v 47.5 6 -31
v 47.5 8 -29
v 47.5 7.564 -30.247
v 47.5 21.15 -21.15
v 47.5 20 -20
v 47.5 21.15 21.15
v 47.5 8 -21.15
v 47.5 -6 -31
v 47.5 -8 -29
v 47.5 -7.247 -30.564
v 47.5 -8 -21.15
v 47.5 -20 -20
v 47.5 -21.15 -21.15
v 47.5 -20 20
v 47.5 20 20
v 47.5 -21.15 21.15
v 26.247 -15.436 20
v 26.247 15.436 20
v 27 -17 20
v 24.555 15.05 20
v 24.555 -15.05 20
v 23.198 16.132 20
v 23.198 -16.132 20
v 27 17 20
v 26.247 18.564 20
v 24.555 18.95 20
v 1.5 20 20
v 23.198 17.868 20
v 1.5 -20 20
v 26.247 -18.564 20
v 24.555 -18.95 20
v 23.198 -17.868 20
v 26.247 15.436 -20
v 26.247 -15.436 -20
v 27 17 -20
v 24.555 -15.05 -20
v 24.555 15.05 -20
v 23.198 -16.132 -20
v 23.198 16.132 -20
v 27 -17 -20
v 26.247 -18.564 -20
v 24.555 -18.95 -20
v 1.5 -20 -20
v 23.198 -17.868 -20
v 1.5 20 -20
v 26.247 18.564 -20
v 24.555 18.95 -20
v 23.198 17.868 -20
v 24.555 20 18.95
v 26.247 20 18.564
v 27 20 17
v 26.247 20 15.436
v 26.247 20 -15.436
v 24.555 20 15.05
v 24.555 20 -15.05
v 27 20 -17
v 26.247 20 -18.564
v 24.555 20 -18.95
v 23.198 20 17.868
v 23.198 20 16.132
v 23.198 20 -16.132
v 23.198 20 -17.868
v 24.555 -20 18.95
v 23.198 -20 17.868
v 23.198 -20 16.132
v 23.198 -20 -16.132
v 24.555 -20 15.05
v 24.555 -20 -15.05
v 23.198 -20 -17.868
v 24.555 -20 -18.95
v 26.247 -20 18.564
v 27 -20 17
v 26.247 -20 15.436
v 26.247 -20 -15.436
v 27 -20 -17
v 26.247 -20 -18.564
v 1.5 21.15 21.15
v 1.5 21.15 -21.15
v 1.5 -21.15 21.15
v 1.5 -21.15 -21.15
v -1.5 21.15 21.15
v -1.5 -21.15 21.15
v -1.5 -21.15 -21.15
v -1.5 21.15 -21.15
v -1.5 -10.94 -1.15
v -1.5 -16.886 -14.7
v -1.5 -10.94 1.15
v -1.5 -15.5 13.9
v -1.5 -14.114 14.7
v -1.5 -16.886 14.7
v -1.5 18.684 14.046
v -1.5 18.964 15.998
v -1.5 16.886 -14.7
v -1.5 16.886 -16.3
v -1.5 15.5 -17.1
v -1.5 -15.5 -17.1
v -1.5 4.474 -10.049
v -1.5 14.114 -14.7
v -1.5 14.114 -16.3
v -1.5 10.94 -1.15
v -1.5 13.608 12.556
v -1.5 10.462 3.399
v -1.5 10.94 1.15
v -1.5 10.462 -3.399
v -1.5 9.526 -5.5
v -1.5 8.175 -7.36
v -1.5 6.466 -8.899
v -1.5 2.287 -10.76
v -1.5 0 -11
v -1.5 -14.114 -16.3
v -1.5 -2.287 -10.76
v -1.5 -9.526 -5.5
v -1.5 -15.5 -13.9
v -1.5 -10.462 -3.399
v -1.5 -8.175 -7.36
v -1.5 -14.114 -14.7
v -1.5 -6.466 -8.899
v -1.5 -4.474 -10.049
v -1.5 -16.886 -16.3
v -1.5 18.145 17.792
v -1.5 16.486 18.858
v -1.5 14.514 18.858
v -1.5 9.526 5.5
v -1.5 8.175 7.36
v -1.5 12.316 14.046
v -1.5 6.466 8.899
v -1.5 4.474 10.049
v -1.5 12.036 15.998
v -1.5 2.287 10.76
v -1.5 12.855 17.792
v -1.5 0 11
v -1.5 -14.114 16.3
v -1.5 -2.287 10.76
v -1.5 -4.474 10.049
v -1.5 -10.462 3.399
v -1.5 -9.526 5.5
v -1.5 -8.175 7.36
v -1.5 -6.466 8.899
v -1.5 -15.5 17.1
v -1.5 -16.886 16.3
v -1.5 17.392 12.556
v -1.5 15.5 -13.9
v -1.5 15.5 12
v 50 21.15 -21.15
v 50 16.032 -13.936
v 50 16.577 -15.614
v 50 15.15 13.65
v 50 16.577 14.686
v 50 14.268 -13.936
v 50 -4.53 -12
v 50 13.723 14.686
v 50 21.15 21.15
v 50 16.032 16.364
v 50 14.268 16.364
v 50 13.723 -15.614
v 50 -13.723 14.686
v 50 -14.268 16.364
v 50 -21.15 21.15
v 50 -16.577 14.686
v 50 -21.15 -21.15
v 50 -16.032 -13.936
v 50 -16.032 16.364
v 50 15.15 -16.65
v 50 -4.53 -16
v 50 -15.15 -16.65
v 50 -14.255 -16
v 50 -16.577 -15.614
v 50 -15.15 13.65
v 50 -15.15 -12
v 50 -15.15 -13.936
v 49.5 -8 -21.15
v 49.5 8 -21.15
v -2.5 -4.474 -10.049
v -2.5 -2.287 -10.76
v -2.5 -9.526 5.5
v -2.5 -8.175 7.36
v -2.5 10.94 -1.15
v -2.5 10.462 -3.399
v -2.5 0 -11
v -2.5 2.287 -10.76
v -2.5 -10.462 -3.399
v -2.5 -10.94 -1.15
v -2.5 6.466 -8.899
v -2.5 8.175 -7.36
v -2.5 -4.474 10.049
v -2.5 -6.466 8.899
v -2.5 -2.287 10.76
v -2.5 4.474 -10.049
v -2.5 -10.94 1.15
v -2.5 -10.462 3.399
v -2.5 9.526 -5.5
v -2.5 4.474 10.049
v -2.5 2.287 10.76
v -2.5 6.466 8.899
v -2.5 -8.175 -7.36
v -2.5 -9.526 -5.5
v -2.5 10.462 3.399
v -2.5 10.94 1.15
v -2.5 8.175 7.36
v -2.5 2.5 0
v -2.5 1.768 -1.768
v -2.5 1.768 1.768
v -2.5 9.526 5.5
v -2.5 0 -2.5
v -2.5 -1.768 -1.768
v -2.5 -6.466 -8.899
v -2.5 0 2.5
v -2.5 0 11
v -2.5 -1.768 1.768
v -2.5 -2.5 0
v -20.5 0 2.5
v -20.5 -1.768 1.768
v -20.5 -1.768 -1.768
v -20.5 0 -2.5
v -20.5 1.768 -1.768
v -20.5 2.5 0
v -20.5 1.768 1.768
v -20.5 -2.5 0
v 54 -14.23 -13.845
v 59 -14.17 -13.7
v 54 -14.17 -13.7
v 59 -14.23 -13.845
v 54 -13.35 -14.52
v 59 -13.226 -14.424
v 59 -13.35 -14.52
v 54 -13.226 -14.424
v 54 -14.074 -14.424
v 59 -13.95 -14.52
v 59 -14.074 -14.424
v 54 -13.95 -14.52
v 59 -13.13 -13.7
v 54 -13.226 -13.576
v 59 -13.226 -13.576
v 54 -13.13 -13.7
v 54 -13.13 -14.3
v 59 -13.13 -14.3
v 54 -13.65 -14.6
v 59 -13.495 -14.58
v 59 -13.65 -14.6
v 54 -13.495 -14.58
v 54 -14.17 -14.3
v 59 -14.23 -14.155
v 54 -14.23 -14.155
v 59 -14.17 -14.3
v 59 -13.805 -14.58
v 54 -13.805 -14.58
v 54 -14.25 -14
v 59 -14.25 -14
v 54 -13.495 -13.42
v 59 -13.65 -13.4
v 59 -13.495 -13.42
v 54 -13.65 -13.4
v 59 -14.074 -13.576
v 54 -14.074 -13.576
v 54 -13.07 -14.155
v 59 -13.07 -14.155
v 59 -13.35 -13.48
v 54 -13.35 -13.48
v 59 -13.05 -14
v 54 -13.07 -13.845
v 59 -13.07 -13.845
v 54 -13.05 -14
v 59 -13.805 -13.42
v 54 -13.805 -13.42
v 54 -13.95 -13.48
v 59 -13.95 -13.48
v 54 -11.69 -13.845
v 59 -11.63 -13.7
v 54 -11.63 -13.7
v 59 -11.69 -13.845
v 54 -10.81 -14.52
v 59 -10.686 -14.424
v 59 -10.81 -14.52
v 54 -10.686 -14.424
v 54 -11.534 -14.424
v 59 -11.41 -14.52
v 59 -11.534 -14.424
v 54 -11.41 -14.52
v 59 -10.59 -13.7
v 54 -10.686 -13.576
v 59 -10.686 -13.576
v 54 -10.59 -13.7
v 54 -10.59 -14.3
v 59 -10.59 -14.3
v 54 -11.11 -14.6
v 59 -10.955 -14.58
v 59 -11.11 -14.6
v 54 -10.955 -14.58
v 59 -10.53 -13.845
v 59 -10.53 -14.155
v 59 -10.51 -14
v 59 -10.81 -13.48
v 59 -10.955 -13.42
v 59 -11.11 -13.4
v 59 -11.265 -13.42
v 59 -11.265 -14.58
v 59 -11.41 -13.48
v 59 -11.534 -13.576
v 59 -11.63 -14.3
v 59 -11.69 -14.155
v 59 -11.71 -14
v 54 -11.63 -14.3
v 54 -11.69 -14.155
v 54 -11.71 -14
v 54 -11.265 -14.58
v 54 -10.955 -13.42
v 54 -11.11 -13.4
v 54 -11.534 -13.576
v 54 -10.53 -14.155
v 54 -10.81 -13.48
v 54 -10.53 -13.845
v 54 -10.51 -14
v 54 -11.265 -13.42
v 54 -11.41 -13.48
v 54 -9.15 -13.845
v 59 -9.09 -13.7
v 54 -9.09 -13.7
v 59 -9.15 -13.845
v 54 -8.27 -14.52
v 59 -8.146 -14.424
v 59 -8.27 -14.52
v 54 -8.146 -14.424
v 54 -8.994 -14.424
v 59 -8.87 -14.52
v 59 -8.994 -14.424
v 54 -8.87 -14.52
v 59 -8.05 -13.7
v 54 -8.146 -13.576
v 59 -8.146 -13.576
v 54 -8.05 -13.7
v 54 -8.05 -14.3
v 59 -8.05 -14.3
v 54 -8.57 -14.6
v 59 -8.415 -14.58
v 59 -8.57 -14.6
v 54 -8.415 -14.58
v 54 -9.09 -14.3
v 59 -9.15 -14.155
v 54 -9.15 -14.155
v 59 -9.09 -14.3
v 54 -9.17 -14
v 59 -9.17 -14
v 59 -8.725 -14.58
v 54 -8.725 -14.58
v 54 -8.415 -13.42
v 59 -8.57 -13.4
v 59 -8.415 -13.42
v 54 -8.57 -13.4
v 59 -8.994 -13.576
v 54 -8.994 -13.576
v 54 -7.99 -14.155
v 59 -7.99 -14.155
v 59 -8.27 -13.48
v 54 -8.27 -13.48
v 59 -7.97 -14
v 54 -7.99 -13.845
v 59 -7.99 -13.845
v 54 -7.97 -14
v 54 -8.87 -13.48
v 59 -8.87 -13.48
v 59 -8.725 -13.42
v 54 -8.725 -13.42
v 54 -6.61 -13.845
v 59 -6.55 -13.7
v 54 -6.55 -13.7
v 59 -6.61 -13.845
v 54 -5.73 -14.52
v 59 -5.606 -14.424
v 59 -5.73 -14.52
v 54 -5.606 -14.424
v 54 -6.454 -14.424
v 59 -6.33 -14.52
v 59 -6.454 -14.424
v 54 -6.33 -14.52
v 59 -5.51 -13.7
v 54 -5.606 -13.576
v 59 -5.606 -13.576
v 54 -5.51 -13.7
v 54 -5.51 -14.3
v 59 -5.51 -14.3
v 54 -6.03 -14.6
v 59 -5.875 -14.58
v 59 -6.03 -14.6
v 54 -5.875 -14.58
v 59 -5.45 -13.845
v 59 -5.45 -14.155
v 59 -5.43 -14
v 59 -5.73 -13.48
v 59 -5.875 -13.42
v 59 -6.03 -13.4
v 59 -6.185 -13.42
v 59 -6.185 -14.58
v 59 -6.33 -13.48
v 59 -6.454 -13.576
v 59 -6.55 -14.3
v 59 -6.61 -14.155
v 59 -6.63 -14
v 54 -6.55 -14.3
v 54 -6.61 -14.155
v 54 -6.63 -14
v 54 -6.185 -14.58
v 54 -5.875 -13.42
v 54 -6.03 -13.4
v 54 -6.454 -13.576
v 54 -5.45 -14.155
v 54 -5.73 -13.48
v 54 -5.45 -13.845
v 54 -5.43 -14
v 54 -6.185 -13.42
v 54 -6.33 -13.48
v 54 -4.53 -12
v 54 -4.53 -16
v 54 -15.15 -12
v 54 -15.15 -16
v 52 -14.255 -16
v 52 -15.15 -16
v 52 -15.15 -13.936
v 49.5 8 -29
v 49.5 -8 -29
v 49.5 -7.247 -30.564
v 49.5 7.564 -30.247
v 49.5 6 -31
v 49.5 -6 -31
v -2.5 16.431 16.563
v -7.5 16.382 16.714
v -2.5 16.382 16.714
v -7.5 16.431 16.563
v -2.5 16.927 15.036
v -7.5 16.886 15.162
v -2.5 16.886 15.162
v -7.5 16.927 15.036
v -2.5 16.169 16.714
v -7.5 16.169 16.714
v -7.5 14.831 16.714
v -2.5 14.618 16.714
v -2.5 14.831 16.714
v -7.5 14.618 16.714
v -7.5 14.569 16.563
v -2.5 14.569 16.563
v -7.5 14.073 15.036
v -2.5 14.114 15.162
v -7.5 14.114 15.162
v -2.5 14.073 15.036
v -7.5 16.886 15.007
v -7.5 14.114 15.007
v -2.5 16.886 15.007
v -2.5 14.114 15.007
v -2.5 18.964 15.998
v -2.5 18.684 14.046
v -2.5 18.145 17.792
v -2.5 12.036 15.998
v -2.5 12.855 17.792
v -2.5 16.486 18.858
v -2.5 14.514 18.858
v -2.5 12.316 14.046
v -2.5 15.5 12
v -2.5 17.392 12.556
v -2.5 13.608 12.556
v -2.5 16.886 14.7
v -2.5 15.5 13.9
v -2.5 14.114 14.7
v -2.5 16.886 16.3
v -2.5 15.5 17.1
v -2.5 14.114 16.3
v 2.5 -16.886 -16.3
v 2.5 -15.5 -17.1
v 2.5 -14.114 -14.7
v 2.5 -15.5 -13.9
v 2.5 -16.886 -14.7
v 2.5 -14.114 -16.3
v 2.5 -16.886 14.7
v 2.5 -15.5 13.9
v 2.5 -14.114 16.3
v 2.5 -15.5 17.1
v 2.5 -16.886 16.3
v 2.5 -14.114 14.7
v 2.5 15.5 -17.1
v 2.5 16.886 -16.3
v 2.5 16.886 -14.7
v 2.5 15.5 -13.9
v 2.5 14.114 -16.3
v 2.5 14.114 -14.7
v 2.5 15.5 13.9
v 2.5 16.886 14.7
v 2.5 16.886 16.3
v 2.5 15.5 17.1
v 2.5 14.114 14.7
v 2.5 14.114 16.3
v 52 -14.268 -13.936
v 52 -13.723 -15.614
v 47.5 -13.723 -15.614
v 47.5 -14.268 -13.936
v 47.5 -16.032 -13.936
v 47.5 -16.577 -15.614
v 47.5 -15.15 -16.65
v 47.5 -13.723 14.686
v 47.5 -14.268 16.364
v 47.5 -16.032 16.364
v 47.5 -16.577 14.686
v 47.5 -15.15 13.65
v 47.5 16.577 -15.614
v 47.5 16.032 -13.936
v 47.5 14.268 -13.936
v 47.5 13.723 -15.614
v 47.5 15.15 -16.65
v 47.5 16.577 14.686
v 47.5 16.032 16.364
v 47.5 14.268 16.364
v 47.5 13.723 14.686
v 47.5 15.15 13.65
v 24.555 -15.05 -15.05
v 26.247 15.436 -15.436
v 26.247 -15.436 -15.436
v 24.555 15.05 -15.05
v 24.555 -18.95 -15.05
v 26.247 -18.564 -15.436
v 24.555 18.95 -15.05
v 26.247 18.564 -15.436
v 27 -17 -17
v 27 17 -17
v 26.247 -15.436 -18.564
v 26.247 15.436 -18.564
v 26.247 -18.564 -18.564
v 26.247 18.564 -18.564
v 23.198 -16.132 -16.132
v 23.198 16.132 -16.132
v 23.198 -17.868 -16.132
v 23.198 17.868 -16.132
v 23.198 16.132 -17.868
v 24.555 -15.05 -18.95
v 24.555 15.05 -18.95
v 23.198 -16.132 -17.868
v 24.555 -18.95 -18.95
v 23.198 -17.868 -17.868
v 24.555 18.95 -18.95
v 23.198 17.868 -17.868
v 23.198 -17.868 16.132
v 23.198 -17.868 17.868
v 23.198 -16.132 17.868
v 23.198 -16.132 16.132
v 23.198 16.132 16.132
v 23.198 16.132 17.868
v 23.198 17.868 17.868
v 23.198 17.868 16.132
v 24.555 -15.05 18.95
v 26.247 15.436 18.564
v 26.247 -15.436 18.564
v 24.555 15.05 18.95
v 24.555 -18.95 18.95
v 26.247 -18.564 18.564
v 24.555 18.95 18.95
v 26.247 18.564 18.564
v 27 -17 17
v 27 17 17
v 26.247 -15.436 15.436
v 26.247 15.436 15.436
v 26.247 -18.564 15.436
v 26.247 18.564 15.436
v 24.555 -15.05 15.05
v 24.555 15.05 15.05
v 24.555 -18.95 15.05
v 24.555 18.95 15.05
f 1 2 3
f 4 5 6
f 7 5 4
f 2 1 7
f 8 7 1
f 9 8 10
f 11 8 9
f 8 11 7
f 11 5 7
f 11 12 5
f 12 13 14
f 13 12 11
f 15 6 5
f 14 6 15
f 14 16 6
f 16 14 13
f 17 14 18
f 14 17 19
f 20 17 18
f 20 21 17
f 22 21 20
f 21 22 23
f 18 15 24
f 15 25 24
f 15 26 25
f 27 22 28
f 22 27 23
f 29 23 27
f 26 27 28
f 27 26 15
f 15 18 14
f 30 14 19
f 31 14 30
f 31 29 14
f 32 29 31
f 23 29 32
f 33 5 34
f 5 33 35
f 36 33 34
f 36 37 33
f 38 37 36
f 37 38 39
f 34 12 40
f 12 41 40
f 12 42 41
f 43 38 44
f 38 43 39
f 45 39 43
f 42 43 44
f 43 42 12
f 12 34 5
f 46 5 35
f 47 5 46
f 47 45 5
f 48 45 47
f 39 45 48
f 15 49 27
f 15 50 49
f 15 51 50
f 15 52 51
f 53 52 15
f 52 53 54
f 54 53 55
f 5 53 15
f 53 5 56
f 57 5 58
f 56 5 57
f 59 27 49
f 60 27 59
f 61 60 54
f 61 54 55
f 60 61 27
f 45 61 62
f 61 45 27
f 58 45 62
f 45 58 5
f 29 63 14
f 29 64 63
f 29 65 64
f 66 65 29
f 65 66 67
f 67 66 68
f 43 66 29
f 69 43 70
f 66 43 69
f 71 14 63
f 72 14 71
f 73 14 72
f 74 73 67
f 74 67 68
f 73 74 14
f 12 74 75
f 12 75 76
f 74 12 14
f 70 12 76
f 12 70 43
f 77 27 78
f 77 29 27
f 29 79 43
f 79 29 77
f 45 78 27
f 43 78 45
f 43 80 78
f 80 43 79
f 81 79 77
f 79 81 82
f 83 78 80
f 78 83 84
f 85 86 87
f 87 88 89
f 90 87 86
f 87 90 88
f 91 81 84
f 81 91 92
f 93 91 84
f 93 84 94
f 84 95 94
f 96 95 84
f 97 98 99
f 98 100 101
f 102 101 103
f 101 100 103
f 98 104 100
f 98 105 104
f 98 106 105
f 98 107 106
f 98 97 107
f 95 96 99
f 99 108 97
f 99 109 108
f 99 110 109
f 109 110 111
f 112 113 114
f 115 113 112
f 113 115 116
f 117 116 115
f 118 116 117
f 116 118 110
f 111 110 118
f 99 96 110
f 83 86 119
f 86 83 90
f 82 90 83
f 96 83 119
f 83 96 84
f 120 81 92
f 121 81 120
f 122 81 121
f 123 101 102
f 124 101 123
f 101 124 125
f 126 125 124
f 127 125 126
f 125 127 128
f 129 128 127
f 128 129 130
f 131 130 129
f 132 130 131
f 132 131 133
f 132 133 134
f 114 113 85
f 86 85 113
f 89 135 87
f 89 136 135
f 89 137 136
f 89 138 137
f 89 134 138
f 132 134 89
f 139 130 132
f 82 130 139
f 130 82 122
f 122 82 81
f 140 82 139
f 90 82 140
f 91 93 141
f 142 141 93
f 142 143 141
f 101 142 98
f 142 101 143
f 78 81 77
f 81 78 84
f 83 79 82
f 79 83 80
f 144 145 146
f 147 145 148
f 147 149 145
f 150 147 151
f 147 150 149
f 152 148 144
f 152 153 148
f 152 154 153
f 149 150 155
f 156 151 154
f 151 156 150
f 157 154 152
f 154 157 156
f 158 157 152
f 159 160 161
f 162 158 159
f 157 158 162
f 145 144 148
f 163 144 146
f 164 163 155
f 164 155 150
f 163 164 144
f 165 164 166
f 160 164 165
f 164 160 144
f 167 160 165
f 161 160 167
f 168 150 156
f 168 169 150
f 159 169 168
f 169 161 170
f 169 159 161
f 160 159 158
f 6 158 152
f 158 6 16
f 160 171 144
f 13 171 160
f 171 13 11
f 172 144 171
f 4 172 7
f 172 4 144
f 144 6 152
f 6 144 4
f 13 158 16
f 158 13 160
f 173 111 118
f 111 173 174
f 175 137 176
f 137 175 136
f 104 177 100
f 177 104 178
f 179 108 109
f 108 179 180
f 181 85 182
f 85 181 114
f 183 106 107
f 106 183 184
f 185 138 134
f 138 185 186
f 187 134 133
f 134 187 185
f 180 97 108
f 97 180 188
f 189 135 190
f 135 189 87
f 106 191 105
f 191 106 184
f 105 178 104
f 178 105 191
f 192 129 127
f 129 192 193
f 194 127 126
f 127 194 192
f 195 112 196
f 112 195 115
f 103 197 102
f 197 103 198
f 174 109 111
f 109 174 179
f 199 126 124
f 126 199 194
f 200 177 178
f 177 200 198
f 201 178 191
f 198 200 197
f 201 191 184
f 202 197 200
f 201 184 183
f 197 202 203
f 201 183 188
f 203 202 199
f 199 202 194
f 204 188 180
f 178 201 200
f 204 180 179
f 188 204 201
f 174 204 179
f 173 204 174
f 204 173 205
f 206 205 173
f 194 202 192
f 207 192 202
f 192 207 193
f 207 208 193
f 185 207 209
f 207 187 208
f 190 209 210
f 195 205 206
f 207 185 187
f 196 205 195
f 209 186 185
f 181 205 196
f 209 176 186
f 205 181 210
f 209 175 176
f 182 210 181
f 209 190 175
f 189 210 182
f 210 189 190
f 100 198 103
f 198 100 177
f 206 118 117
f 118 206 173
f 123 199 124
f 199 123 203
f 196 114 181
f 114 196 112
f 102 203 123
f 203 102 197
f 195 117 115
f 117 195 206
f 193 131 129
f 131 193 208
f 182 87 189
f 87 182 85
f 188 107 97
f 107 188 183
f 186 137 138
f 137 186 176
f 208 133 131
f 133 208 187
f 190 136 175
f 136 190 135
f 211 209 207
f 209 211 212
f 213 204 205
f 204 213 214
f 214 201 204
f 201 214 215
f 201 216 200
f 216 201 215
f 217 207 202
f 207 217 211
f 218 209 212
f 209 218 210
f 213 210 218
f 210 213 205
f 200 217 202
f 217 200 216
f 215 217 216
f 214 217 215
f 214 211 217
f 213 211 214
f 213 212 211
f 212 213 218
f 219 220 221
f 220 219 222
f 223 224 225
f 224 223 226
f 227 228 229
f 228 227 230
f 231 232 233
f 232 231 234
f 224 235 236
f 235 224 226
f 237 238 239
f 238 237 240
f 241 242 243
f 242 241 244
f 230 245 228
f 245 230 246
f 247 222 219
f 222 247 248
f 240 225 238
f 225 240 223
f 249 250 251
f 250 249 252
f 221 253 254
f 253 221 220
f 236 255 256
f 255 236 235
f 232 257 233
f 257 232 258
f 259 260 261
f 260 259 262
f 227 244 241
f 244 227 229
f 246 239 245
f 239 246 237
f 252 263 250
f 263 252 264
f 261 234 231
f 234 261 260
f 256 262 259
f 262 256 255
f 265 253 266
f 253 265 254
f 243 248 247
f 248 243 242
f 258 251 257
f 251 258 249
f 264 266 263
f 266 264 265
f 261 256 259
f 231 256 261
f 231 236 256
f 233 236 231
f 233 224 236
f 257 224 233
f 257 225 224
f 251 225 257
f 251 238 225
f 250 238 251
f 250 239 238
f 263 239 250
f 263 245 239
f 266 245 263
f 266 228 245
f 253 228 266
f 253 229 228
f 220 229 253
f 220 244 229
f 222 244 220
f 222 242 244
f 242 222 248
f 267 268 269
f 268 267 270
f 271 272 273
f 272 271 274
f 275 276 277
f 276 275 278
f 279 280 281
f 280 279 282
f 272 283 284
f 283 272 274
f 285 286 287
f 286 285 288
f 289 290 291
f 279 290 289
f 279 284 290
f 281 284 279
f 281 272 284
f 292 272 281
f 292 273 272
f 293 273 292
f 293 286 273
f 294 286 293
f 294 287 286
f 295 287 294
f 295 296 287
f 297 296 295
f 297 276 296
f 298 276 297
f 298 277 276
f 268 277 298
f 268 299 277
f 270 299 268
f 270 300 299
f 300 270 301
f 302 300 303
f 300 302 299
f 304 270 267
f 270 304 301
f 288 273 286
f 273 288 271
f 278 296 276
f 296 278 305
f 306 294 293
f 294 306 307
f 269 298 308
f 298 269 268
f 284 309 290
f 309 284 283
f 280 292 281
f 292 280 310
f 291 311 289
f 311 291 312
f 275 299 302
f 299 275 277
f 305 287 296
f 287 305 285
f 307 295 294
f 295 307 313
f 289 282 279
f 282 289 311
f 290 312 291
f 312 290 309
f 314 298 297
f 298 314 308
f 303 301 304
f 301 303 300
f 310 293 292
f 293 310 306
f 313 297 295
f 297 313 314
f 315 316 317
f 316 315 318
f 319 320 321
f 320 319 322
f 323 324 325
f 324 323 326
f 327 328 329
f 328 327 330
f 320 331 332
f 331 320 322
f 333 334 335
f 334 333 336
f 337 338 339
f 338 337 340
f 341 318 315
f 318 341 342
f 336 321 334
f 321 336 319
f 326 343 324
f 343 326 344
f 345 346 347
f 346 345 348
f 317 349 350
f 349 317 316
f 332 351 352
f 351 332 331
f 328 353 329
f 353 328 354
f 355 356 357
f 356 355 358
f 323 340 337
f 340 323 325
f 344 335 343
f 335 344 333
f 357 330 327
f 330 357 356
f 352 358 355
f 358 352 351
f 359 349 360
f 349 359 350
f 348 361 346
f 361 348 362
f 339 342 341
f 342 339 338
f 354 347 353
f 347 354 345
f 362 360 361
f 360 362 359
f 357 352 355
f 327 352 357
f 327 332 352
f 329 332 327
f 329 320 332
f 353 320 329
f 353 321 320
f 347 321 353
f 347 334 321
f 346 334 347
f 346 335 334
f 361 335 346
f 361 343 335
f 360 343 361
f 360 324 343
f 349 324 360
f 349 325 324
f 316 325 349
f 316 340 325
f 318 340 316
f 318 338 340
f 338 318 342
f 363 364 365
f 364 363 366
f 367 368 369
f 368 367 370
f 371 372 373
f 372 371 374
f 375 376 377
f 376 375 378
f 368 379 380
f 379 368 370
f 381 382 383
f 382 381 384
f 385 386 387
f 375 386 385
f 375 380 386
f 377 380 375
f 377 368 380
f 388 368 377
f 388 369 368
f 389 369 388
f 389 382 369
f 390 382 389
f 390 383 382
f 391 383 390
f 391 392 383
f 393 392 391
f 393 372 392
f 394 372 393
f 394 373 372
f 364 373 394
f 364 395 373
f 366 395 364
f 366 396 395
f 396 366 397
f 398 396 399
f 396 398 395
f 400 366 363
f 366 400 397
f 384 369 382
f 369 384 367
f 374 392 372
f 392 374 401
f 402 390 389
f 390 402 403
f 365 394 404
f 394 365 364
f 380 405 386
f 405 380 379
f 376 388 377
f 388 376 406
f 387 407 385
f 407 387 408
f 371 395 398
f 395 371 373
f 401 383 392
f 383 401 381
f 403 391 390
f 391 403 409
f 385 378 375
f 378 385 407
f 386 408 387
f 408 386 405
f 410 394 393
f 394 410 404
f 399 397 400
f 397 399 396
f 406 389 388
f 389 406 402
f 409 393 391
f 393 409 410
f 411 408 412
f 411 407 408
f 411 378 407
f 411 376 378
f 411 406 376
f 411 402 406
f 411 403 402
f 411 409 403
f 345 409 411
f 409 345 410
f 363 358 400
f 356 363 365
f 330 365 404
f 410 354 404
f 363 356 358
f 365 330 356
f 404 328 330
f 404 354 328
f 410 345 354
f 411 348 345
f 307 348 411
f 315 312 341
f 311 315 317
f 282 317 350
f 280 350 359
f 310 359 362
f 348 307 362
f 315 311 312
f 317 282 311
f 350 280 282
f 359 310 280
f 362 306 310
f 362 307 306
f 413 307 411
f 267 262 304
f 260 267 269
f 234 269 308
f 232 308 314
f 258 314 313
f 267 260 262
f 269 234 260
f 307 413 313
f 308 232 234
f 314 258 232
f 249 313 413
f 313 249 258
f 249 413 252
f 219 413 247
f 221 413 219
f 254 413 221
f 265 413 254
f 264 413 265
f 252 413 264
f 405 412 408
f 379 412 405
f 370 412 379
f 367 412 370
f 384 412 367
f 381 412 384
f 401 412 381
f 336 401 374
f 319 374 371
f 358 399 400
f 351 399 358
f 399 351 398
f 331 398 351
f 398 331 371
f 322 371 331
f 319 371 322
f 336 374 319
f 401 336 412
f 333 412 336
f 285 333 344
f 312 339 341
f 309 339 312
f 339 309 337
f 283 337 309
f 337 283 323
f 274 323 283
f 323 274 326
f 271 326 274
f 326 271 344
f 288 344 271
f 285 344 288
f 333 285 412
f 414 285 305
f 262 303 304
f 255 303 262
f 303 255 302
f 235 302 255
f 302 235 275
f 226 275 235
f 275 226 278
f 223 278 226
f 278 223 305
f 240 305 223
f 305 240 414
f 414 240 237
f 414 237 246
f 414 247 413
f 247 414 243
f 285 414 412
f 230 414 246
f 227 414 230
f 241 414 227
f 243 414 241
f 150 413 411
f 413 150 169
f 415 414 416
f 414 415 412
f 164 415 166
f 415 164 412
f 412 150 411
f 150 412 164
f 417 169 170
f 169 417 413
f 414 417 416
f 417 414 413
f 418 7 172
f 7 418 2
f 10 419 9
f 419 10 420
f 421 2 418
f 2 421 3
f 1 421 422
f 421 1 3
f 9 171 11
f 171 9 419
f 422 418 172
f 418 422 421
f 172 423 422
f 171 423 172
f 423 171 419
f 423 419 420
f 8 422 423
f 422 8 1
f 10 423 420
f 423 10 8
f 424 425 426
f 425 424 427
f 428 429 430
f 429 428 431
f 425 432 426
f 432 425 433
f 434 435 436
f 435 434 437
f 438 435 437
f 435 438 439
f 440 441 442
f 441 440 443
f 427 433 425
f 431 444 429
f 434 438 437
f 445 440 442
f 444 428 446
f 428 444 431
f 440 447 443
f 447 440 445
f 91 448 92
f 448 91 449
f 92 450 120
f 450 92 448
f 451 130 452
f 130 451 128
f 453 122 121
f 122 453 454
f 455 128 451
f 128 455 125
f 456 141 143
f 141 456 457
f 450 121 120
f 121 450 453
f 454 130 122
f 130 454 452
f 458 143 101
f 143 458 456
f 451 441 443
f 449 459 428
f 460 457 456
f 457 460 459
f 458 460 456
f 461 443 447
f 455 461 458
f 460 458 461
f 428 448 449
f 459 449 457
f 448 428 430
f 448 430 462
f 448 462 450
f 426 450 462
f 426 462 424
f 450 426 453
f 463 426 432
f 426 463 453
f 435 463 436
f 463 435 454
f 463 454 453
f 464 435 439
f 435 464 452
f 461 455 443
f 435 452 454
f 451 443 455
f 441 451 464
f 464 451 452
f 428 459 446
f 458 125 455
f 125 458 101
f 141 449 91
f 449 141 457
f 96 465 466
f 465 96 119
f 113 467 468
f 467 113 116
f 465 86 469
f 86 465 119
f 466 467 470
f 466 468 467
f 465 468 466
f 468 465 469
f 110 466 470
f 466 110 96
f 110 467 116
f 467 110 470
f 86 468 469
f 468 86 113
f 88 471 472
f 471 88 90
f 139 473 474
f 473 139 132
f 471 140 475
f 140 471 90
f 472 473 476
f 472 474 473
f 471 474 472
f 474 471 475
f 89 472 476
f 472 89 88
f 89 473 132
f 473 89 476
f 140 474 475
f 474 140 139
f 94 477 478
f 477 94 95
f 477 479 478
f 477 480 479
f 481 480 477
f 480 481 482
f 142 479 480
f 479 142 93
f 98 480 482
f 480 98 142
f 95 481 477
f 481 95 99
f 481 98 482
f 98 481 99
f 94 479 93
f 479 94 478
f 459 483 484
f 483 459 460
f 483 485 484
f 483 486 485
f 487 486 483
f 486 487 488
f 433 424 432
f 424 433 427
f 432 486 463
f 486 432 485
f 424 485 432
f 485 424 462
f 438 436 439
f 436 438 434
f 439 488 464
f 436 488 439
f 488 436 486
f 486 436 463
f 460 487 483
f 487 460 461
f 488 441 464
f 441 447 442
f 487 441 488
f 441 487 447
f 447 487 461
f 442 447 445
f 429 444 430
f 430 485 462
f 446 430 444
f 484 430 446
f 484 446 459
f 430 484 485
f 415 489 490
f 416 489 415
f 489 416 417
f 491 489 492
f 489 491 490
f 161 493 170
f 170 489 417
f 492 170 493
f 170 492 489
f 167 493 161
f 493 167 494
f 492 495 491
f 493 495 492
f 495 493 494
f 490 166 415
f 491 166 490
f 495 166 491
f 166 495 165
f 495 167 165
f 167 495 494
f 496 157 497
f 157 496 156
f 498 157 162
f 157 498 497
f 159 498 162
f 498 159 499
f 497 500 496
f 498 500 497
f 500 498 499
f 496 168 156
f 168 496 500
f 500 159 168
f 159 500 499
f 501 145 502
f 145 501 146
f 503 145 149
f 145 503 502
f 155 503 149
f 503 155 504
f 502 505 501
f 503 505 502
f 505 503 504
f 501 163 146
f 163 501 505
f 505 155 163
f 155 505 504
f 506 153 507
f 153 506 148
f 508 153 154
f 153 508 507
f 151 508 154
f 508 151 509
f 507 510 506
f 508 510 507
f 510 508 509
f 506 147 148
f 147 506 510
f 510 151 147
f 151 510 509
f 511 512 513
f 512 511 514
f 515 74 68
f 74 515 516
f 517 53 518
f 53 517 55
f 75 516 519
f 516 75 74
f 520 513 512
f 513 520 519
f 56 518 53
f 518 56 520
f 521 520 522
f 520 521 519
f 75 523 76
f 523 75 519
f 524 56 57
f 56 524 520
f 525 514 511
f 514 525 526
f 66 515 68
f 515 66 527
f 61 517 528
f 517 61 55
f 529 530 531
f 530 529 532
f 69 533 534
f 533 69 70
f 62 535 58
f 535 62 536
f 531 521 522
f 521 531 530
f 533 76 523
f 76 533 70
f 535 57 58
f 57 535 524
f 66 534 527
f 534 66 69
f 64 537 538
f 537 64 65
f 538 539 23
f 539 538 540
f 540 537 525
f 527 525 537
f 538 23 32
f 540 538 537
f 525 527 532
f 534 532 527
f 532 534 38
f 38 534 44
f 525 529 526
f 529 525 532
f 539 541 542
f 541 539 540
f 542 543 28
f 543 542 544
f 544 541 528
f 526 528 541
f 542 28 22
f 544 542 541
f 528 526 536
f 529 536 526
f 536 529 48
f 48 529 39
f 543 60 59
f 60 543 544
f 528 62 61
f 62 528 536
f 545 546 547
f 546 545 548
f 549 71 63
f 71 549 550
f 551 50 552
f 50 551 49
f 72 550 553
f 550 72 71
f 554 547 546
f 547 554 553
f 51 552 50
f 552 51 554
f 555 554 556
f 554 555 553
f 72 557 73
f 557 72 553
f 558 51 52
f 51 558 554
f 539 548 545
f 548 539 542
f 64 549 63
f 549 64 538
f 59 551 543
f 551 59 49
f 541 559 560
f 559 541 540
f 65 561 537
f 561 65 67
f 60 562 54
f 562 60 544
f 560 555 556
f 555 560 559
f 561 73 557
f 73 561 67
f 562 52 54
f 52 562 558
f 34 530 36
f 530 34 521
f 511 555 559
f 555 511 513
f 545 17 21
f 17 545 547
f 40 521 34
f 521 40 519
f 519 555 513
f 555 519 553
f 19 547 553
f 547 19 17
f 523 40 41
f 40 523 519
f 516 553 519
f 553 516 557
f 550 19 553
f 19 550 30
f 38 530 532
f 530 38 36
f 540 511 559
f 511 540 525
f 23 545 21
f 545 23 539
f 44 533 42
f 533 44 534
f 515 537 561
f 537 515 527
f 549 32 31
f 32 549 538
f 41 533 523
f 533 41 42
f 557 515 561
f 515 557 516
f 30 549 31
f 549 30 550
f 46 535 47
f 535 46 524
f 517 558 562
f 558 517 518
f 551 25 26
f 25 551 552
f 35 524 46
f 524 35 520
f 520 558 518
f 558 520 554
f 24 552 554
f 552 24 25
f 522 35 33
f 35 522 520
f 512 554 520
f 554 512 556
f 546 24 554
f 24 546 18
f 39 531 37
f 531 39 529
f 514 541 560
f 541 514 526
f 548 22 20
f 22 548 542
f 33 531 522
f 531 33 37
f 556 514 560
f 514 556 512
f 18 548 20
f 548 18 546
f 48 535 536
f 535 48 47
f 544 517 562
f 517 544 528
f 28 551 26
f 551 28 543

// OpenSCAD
// Parameters
face_width = 42.3; //[21.15:84.6:0.1]
body_length = 47; //[23.5:94:0.1]
body_depth = 40; //[20:80:0.1]
body_height = 40; //[20:80:0.1]
front_face_thickness = 3; //[1.5:6:0.1]
rear_cap_thickness = 2.5; //[1.25:5:0.1]
corner_radius = 2; //[1:4:0.1]
boss_diameter = 22; //[11:44:0.1]
boss_height = 2; //[1:4:0.1]
shaft_diameter = 5; //[2.5:10:0.1]
shaft_length = 20; //[10:40:0.1]
mount_hole_spacing = 31; //[15.5:62:0.1]
mount_hole_diameter = 3.2; //[1.6:6.4:0.1]
mount_hole_depth = 6; //[3:12:0.1]
eps_overlap = 1; //[0.5:2:0.1]
dplug_length = 18; //[9:36:0.1]
dplug_width = 12; //[6:24:0.1]
dplug_rad = 2; //[1:4:0.1]
dplug_thickness = 2; //[1:4:0.1]
grill_hole_diameter = 3; //[1.5:6:0.1]
grill_margin = 6; //[3:12:0.1]
ttrack_hole_diameter = 4; //[2:8:0.1]
rail_hole_diameter = 4; //[2:8:0.1]
screw_shank_diameter = 3; //[1.5:6:0.1]
screw_length = 10; //[5:20:0.1]
washer_diameter = 7; //[3.5:14:0.1]
washer_thickness = 1; //[0.5:2:0.1]

// Added: rear electrical connector/pins (and ensured attachment)
pin_diameter = 1.2;
pin_length = 6;
pin_spacing = 2.54;
pin_count = 4;
pin_block_w = (pin_count-1)*pin_spacing + 3.0;  // small housing width
pin_block_h = 4.0;
pin_block_t = 4.0; // thickness along X (sticks out of rear)
pin_z_offset = -body_height/2 + 6; // near bottom like typical motors

// Convenience: rear face X position of the rear cap (outermost)
rear_face_x = front_face_thickness/2 + body_length + rear_cap_thickness/2;

// NEMA-style stepper motor
module NEMA_motor() {
  // Motor body
  color("Black")
  union() {
    translate([front_face_thickness/2 + body_length/2 - eps_overlap, 0, 0])
      cube([body_length, body_depth, body_height], center=true);

    // Front face
    translate([0, 0, 0])
      cube([front_face_thickness, face_width, face_width], center=true);

    // Rear cap
    translate([rear_face_x - eps_overlap, 0, 0])
      cube([rear_cap_thickness, face_width, face_width], center=true);

    // Shaft center boss
    translate([-front_face_thickness/2 - boss_height/2 + eps_overlap, 0, 0])
      rotate([0, 90, 0])
      cylinder(r=boss_diameter/2, h=boss_height, center=true);

    // Output shaft
    color("Silver")
    translate([-front_face_thickness/2 - shaft_length/2 + eps_overlap, 0, 0])
      rotate([0, 90, 0])
      cylinder(r=shaft_diameter/2, h=shaft_length, center=true);
  }
}

// Rear electrical connector/pins (physically attached with overlap into rear cap)
module rear_connector_and_pins() {
  // Place connector so it intersects the rear cap by eps_overlap (1-2mm)
  // Rear cap outer face is at: rear_face_x + rear_cap_thickness/2
  // We want the connector block to start inside the cap by eps_overlap.
  conn_center_x =
    (rear_face_x + rear_cap_thickness/2) + (pin_block_t/2) - eps_overlap;

  // Put it near one side/bottom like typical NEMA motors
  conn_center_y = -face_width/2 + pin_block_w/2 + 6;

  union() {
    // Small housing block (grey)
    color("DimGray")
      translate([conn_center_x, conn_center_y, pin_z_offset])
        cube([pin_block_t, pin_block_w, pin_block_h], center=true);

    // Pins (orange) protruding further out, but rooted inside the housing
    // Ensure each pin overlaps into the housing by eps_overlap.
    color("Orange")
      for (i = [0:pin_count-1]) {
        y_i = conn_center_y + (i - (pin_count-1)/2) * pin_spacing;
        translate([
          conn_center_x + pin_block_t/2 + pin_length/2 - eps_overlap,
          y_i,
          pin_z_offset
        ])
          rotate([0, 90, 0])
          cylinder(r=pin_diameter/2, h=pin_length, center=true, $fn=24);
      }
  }
}

// D Plug D (kept, but ensured it intersects the body slightly)
module d_plug_D() {
  // Attach to rear area and overlap into the rear cap/body by eps_overlap
  plug_center_x =
    (rear_face_x - rear_cap_thickness/2) + (dplug_thickness/2) - eps_overlap;

  color("DimGray")
    translate([plug_center_x, 0, -body_height/2 + dplug_thickness/2 - eps_overlap])
      rotate([0, 90, 0])
      linear_extrude(height=dplug_thickness, center=true)
      offset(r=dplug_rad)
      square([dplug_length, dplug_width], center=true);
}

// Grill Hole Positions (cutters)
module grill_hole_positions() {
  for (x = [-1, 1])
    for (y = [-1, 1])
      translate([rear_face_x, x * (face_width/2 - grill_margin), y * (face_width/2 - grill_margin)])
        rotate([0, 90, 0])
        cylinder(r=grill_hole_diameter/2, h=rear_cap_thickness + 2*eps_overlap, center=true);
}

// Screw and Washer (kept as-is; these are external hardware, but unioned)
module screw_and_washer() {
  color("Silver") {
    // Screw shank
    translate([front_face_thickness/2 - screw_length/2 + eps_overlap, mount_hole_spacing/2, mount_hole_spacing/2])
      rotate([0, 90, 0])
      cylinder(r=screw_shank_diameter/2, h=screw_length, center=true);
    // Washer
    translate([-front_face_thickness/2 + washer_thickness/2 - eps_overlap, mount_hole_spacing/2, mount_hole_spacing/2])
      rotate([0, 90, 0])
      cylinder(r=washer_diameter/2, h=washer_thickness, center=true);
  }
}

// Ttrack Hole Positions (cutters)
module ttrack_hole_positions() {
  for (z = [-1, 1])
    translate([front_face_thickness/2 + body_length/2, 0, z * (body_height/2 - ttrack_hole_diameter/2 - eps_overlap)])
      rotate([90, 0, 0])
      cylinder(r=ttrack_hole_diameter/2, h=body_depth + 2*eps_overlap, center=true);
}

// Rail Hole Positions (cutters)
module rail_hole_positions() {
  for (y = [-1, 1])
    translate([front_face_thickness/2 + body_length/2, y * (body_depth/2 - rail_hole_diameter/2 - eps_overlap), 0])
      cylinder(r=rail_hole_diameter/2, h=body_height + 2*eps_overlap, center=true);
}

// Assembly
module assembly() {
  difference() {
    union() {
      // Single connected solid for the motor + attached rear connector
      union() {
        NEMA_motor();
        rear_connector_and_pins(); // FIX: now intersects rear cap by eps_overlap
        d_plug_D();                // ensured overlap into rear cap/body
      }
      // External hardware (kept)
      screw_and_washer();
    }

    union() {
      // Mounting holes
      for (x = [-1, 1])
        for (y = [-1, 1])
          translate([front_face_thickness/2 - (mount_hole_depth + front_face_thickness)/2, x * mount_hole_spacing/2, y * mount_hole_spacing/2])
            rotate([0, 90, 0])
            cylinder(r=mount_hole_diameter/2, h=mount_hole_depth + front_face_thickness + 2*eps_overlap, center=true);

      grill_hole_positions();
      ttrack_hole_positions();
      rail_hole_positions();
    }
  }
}

assembly();
